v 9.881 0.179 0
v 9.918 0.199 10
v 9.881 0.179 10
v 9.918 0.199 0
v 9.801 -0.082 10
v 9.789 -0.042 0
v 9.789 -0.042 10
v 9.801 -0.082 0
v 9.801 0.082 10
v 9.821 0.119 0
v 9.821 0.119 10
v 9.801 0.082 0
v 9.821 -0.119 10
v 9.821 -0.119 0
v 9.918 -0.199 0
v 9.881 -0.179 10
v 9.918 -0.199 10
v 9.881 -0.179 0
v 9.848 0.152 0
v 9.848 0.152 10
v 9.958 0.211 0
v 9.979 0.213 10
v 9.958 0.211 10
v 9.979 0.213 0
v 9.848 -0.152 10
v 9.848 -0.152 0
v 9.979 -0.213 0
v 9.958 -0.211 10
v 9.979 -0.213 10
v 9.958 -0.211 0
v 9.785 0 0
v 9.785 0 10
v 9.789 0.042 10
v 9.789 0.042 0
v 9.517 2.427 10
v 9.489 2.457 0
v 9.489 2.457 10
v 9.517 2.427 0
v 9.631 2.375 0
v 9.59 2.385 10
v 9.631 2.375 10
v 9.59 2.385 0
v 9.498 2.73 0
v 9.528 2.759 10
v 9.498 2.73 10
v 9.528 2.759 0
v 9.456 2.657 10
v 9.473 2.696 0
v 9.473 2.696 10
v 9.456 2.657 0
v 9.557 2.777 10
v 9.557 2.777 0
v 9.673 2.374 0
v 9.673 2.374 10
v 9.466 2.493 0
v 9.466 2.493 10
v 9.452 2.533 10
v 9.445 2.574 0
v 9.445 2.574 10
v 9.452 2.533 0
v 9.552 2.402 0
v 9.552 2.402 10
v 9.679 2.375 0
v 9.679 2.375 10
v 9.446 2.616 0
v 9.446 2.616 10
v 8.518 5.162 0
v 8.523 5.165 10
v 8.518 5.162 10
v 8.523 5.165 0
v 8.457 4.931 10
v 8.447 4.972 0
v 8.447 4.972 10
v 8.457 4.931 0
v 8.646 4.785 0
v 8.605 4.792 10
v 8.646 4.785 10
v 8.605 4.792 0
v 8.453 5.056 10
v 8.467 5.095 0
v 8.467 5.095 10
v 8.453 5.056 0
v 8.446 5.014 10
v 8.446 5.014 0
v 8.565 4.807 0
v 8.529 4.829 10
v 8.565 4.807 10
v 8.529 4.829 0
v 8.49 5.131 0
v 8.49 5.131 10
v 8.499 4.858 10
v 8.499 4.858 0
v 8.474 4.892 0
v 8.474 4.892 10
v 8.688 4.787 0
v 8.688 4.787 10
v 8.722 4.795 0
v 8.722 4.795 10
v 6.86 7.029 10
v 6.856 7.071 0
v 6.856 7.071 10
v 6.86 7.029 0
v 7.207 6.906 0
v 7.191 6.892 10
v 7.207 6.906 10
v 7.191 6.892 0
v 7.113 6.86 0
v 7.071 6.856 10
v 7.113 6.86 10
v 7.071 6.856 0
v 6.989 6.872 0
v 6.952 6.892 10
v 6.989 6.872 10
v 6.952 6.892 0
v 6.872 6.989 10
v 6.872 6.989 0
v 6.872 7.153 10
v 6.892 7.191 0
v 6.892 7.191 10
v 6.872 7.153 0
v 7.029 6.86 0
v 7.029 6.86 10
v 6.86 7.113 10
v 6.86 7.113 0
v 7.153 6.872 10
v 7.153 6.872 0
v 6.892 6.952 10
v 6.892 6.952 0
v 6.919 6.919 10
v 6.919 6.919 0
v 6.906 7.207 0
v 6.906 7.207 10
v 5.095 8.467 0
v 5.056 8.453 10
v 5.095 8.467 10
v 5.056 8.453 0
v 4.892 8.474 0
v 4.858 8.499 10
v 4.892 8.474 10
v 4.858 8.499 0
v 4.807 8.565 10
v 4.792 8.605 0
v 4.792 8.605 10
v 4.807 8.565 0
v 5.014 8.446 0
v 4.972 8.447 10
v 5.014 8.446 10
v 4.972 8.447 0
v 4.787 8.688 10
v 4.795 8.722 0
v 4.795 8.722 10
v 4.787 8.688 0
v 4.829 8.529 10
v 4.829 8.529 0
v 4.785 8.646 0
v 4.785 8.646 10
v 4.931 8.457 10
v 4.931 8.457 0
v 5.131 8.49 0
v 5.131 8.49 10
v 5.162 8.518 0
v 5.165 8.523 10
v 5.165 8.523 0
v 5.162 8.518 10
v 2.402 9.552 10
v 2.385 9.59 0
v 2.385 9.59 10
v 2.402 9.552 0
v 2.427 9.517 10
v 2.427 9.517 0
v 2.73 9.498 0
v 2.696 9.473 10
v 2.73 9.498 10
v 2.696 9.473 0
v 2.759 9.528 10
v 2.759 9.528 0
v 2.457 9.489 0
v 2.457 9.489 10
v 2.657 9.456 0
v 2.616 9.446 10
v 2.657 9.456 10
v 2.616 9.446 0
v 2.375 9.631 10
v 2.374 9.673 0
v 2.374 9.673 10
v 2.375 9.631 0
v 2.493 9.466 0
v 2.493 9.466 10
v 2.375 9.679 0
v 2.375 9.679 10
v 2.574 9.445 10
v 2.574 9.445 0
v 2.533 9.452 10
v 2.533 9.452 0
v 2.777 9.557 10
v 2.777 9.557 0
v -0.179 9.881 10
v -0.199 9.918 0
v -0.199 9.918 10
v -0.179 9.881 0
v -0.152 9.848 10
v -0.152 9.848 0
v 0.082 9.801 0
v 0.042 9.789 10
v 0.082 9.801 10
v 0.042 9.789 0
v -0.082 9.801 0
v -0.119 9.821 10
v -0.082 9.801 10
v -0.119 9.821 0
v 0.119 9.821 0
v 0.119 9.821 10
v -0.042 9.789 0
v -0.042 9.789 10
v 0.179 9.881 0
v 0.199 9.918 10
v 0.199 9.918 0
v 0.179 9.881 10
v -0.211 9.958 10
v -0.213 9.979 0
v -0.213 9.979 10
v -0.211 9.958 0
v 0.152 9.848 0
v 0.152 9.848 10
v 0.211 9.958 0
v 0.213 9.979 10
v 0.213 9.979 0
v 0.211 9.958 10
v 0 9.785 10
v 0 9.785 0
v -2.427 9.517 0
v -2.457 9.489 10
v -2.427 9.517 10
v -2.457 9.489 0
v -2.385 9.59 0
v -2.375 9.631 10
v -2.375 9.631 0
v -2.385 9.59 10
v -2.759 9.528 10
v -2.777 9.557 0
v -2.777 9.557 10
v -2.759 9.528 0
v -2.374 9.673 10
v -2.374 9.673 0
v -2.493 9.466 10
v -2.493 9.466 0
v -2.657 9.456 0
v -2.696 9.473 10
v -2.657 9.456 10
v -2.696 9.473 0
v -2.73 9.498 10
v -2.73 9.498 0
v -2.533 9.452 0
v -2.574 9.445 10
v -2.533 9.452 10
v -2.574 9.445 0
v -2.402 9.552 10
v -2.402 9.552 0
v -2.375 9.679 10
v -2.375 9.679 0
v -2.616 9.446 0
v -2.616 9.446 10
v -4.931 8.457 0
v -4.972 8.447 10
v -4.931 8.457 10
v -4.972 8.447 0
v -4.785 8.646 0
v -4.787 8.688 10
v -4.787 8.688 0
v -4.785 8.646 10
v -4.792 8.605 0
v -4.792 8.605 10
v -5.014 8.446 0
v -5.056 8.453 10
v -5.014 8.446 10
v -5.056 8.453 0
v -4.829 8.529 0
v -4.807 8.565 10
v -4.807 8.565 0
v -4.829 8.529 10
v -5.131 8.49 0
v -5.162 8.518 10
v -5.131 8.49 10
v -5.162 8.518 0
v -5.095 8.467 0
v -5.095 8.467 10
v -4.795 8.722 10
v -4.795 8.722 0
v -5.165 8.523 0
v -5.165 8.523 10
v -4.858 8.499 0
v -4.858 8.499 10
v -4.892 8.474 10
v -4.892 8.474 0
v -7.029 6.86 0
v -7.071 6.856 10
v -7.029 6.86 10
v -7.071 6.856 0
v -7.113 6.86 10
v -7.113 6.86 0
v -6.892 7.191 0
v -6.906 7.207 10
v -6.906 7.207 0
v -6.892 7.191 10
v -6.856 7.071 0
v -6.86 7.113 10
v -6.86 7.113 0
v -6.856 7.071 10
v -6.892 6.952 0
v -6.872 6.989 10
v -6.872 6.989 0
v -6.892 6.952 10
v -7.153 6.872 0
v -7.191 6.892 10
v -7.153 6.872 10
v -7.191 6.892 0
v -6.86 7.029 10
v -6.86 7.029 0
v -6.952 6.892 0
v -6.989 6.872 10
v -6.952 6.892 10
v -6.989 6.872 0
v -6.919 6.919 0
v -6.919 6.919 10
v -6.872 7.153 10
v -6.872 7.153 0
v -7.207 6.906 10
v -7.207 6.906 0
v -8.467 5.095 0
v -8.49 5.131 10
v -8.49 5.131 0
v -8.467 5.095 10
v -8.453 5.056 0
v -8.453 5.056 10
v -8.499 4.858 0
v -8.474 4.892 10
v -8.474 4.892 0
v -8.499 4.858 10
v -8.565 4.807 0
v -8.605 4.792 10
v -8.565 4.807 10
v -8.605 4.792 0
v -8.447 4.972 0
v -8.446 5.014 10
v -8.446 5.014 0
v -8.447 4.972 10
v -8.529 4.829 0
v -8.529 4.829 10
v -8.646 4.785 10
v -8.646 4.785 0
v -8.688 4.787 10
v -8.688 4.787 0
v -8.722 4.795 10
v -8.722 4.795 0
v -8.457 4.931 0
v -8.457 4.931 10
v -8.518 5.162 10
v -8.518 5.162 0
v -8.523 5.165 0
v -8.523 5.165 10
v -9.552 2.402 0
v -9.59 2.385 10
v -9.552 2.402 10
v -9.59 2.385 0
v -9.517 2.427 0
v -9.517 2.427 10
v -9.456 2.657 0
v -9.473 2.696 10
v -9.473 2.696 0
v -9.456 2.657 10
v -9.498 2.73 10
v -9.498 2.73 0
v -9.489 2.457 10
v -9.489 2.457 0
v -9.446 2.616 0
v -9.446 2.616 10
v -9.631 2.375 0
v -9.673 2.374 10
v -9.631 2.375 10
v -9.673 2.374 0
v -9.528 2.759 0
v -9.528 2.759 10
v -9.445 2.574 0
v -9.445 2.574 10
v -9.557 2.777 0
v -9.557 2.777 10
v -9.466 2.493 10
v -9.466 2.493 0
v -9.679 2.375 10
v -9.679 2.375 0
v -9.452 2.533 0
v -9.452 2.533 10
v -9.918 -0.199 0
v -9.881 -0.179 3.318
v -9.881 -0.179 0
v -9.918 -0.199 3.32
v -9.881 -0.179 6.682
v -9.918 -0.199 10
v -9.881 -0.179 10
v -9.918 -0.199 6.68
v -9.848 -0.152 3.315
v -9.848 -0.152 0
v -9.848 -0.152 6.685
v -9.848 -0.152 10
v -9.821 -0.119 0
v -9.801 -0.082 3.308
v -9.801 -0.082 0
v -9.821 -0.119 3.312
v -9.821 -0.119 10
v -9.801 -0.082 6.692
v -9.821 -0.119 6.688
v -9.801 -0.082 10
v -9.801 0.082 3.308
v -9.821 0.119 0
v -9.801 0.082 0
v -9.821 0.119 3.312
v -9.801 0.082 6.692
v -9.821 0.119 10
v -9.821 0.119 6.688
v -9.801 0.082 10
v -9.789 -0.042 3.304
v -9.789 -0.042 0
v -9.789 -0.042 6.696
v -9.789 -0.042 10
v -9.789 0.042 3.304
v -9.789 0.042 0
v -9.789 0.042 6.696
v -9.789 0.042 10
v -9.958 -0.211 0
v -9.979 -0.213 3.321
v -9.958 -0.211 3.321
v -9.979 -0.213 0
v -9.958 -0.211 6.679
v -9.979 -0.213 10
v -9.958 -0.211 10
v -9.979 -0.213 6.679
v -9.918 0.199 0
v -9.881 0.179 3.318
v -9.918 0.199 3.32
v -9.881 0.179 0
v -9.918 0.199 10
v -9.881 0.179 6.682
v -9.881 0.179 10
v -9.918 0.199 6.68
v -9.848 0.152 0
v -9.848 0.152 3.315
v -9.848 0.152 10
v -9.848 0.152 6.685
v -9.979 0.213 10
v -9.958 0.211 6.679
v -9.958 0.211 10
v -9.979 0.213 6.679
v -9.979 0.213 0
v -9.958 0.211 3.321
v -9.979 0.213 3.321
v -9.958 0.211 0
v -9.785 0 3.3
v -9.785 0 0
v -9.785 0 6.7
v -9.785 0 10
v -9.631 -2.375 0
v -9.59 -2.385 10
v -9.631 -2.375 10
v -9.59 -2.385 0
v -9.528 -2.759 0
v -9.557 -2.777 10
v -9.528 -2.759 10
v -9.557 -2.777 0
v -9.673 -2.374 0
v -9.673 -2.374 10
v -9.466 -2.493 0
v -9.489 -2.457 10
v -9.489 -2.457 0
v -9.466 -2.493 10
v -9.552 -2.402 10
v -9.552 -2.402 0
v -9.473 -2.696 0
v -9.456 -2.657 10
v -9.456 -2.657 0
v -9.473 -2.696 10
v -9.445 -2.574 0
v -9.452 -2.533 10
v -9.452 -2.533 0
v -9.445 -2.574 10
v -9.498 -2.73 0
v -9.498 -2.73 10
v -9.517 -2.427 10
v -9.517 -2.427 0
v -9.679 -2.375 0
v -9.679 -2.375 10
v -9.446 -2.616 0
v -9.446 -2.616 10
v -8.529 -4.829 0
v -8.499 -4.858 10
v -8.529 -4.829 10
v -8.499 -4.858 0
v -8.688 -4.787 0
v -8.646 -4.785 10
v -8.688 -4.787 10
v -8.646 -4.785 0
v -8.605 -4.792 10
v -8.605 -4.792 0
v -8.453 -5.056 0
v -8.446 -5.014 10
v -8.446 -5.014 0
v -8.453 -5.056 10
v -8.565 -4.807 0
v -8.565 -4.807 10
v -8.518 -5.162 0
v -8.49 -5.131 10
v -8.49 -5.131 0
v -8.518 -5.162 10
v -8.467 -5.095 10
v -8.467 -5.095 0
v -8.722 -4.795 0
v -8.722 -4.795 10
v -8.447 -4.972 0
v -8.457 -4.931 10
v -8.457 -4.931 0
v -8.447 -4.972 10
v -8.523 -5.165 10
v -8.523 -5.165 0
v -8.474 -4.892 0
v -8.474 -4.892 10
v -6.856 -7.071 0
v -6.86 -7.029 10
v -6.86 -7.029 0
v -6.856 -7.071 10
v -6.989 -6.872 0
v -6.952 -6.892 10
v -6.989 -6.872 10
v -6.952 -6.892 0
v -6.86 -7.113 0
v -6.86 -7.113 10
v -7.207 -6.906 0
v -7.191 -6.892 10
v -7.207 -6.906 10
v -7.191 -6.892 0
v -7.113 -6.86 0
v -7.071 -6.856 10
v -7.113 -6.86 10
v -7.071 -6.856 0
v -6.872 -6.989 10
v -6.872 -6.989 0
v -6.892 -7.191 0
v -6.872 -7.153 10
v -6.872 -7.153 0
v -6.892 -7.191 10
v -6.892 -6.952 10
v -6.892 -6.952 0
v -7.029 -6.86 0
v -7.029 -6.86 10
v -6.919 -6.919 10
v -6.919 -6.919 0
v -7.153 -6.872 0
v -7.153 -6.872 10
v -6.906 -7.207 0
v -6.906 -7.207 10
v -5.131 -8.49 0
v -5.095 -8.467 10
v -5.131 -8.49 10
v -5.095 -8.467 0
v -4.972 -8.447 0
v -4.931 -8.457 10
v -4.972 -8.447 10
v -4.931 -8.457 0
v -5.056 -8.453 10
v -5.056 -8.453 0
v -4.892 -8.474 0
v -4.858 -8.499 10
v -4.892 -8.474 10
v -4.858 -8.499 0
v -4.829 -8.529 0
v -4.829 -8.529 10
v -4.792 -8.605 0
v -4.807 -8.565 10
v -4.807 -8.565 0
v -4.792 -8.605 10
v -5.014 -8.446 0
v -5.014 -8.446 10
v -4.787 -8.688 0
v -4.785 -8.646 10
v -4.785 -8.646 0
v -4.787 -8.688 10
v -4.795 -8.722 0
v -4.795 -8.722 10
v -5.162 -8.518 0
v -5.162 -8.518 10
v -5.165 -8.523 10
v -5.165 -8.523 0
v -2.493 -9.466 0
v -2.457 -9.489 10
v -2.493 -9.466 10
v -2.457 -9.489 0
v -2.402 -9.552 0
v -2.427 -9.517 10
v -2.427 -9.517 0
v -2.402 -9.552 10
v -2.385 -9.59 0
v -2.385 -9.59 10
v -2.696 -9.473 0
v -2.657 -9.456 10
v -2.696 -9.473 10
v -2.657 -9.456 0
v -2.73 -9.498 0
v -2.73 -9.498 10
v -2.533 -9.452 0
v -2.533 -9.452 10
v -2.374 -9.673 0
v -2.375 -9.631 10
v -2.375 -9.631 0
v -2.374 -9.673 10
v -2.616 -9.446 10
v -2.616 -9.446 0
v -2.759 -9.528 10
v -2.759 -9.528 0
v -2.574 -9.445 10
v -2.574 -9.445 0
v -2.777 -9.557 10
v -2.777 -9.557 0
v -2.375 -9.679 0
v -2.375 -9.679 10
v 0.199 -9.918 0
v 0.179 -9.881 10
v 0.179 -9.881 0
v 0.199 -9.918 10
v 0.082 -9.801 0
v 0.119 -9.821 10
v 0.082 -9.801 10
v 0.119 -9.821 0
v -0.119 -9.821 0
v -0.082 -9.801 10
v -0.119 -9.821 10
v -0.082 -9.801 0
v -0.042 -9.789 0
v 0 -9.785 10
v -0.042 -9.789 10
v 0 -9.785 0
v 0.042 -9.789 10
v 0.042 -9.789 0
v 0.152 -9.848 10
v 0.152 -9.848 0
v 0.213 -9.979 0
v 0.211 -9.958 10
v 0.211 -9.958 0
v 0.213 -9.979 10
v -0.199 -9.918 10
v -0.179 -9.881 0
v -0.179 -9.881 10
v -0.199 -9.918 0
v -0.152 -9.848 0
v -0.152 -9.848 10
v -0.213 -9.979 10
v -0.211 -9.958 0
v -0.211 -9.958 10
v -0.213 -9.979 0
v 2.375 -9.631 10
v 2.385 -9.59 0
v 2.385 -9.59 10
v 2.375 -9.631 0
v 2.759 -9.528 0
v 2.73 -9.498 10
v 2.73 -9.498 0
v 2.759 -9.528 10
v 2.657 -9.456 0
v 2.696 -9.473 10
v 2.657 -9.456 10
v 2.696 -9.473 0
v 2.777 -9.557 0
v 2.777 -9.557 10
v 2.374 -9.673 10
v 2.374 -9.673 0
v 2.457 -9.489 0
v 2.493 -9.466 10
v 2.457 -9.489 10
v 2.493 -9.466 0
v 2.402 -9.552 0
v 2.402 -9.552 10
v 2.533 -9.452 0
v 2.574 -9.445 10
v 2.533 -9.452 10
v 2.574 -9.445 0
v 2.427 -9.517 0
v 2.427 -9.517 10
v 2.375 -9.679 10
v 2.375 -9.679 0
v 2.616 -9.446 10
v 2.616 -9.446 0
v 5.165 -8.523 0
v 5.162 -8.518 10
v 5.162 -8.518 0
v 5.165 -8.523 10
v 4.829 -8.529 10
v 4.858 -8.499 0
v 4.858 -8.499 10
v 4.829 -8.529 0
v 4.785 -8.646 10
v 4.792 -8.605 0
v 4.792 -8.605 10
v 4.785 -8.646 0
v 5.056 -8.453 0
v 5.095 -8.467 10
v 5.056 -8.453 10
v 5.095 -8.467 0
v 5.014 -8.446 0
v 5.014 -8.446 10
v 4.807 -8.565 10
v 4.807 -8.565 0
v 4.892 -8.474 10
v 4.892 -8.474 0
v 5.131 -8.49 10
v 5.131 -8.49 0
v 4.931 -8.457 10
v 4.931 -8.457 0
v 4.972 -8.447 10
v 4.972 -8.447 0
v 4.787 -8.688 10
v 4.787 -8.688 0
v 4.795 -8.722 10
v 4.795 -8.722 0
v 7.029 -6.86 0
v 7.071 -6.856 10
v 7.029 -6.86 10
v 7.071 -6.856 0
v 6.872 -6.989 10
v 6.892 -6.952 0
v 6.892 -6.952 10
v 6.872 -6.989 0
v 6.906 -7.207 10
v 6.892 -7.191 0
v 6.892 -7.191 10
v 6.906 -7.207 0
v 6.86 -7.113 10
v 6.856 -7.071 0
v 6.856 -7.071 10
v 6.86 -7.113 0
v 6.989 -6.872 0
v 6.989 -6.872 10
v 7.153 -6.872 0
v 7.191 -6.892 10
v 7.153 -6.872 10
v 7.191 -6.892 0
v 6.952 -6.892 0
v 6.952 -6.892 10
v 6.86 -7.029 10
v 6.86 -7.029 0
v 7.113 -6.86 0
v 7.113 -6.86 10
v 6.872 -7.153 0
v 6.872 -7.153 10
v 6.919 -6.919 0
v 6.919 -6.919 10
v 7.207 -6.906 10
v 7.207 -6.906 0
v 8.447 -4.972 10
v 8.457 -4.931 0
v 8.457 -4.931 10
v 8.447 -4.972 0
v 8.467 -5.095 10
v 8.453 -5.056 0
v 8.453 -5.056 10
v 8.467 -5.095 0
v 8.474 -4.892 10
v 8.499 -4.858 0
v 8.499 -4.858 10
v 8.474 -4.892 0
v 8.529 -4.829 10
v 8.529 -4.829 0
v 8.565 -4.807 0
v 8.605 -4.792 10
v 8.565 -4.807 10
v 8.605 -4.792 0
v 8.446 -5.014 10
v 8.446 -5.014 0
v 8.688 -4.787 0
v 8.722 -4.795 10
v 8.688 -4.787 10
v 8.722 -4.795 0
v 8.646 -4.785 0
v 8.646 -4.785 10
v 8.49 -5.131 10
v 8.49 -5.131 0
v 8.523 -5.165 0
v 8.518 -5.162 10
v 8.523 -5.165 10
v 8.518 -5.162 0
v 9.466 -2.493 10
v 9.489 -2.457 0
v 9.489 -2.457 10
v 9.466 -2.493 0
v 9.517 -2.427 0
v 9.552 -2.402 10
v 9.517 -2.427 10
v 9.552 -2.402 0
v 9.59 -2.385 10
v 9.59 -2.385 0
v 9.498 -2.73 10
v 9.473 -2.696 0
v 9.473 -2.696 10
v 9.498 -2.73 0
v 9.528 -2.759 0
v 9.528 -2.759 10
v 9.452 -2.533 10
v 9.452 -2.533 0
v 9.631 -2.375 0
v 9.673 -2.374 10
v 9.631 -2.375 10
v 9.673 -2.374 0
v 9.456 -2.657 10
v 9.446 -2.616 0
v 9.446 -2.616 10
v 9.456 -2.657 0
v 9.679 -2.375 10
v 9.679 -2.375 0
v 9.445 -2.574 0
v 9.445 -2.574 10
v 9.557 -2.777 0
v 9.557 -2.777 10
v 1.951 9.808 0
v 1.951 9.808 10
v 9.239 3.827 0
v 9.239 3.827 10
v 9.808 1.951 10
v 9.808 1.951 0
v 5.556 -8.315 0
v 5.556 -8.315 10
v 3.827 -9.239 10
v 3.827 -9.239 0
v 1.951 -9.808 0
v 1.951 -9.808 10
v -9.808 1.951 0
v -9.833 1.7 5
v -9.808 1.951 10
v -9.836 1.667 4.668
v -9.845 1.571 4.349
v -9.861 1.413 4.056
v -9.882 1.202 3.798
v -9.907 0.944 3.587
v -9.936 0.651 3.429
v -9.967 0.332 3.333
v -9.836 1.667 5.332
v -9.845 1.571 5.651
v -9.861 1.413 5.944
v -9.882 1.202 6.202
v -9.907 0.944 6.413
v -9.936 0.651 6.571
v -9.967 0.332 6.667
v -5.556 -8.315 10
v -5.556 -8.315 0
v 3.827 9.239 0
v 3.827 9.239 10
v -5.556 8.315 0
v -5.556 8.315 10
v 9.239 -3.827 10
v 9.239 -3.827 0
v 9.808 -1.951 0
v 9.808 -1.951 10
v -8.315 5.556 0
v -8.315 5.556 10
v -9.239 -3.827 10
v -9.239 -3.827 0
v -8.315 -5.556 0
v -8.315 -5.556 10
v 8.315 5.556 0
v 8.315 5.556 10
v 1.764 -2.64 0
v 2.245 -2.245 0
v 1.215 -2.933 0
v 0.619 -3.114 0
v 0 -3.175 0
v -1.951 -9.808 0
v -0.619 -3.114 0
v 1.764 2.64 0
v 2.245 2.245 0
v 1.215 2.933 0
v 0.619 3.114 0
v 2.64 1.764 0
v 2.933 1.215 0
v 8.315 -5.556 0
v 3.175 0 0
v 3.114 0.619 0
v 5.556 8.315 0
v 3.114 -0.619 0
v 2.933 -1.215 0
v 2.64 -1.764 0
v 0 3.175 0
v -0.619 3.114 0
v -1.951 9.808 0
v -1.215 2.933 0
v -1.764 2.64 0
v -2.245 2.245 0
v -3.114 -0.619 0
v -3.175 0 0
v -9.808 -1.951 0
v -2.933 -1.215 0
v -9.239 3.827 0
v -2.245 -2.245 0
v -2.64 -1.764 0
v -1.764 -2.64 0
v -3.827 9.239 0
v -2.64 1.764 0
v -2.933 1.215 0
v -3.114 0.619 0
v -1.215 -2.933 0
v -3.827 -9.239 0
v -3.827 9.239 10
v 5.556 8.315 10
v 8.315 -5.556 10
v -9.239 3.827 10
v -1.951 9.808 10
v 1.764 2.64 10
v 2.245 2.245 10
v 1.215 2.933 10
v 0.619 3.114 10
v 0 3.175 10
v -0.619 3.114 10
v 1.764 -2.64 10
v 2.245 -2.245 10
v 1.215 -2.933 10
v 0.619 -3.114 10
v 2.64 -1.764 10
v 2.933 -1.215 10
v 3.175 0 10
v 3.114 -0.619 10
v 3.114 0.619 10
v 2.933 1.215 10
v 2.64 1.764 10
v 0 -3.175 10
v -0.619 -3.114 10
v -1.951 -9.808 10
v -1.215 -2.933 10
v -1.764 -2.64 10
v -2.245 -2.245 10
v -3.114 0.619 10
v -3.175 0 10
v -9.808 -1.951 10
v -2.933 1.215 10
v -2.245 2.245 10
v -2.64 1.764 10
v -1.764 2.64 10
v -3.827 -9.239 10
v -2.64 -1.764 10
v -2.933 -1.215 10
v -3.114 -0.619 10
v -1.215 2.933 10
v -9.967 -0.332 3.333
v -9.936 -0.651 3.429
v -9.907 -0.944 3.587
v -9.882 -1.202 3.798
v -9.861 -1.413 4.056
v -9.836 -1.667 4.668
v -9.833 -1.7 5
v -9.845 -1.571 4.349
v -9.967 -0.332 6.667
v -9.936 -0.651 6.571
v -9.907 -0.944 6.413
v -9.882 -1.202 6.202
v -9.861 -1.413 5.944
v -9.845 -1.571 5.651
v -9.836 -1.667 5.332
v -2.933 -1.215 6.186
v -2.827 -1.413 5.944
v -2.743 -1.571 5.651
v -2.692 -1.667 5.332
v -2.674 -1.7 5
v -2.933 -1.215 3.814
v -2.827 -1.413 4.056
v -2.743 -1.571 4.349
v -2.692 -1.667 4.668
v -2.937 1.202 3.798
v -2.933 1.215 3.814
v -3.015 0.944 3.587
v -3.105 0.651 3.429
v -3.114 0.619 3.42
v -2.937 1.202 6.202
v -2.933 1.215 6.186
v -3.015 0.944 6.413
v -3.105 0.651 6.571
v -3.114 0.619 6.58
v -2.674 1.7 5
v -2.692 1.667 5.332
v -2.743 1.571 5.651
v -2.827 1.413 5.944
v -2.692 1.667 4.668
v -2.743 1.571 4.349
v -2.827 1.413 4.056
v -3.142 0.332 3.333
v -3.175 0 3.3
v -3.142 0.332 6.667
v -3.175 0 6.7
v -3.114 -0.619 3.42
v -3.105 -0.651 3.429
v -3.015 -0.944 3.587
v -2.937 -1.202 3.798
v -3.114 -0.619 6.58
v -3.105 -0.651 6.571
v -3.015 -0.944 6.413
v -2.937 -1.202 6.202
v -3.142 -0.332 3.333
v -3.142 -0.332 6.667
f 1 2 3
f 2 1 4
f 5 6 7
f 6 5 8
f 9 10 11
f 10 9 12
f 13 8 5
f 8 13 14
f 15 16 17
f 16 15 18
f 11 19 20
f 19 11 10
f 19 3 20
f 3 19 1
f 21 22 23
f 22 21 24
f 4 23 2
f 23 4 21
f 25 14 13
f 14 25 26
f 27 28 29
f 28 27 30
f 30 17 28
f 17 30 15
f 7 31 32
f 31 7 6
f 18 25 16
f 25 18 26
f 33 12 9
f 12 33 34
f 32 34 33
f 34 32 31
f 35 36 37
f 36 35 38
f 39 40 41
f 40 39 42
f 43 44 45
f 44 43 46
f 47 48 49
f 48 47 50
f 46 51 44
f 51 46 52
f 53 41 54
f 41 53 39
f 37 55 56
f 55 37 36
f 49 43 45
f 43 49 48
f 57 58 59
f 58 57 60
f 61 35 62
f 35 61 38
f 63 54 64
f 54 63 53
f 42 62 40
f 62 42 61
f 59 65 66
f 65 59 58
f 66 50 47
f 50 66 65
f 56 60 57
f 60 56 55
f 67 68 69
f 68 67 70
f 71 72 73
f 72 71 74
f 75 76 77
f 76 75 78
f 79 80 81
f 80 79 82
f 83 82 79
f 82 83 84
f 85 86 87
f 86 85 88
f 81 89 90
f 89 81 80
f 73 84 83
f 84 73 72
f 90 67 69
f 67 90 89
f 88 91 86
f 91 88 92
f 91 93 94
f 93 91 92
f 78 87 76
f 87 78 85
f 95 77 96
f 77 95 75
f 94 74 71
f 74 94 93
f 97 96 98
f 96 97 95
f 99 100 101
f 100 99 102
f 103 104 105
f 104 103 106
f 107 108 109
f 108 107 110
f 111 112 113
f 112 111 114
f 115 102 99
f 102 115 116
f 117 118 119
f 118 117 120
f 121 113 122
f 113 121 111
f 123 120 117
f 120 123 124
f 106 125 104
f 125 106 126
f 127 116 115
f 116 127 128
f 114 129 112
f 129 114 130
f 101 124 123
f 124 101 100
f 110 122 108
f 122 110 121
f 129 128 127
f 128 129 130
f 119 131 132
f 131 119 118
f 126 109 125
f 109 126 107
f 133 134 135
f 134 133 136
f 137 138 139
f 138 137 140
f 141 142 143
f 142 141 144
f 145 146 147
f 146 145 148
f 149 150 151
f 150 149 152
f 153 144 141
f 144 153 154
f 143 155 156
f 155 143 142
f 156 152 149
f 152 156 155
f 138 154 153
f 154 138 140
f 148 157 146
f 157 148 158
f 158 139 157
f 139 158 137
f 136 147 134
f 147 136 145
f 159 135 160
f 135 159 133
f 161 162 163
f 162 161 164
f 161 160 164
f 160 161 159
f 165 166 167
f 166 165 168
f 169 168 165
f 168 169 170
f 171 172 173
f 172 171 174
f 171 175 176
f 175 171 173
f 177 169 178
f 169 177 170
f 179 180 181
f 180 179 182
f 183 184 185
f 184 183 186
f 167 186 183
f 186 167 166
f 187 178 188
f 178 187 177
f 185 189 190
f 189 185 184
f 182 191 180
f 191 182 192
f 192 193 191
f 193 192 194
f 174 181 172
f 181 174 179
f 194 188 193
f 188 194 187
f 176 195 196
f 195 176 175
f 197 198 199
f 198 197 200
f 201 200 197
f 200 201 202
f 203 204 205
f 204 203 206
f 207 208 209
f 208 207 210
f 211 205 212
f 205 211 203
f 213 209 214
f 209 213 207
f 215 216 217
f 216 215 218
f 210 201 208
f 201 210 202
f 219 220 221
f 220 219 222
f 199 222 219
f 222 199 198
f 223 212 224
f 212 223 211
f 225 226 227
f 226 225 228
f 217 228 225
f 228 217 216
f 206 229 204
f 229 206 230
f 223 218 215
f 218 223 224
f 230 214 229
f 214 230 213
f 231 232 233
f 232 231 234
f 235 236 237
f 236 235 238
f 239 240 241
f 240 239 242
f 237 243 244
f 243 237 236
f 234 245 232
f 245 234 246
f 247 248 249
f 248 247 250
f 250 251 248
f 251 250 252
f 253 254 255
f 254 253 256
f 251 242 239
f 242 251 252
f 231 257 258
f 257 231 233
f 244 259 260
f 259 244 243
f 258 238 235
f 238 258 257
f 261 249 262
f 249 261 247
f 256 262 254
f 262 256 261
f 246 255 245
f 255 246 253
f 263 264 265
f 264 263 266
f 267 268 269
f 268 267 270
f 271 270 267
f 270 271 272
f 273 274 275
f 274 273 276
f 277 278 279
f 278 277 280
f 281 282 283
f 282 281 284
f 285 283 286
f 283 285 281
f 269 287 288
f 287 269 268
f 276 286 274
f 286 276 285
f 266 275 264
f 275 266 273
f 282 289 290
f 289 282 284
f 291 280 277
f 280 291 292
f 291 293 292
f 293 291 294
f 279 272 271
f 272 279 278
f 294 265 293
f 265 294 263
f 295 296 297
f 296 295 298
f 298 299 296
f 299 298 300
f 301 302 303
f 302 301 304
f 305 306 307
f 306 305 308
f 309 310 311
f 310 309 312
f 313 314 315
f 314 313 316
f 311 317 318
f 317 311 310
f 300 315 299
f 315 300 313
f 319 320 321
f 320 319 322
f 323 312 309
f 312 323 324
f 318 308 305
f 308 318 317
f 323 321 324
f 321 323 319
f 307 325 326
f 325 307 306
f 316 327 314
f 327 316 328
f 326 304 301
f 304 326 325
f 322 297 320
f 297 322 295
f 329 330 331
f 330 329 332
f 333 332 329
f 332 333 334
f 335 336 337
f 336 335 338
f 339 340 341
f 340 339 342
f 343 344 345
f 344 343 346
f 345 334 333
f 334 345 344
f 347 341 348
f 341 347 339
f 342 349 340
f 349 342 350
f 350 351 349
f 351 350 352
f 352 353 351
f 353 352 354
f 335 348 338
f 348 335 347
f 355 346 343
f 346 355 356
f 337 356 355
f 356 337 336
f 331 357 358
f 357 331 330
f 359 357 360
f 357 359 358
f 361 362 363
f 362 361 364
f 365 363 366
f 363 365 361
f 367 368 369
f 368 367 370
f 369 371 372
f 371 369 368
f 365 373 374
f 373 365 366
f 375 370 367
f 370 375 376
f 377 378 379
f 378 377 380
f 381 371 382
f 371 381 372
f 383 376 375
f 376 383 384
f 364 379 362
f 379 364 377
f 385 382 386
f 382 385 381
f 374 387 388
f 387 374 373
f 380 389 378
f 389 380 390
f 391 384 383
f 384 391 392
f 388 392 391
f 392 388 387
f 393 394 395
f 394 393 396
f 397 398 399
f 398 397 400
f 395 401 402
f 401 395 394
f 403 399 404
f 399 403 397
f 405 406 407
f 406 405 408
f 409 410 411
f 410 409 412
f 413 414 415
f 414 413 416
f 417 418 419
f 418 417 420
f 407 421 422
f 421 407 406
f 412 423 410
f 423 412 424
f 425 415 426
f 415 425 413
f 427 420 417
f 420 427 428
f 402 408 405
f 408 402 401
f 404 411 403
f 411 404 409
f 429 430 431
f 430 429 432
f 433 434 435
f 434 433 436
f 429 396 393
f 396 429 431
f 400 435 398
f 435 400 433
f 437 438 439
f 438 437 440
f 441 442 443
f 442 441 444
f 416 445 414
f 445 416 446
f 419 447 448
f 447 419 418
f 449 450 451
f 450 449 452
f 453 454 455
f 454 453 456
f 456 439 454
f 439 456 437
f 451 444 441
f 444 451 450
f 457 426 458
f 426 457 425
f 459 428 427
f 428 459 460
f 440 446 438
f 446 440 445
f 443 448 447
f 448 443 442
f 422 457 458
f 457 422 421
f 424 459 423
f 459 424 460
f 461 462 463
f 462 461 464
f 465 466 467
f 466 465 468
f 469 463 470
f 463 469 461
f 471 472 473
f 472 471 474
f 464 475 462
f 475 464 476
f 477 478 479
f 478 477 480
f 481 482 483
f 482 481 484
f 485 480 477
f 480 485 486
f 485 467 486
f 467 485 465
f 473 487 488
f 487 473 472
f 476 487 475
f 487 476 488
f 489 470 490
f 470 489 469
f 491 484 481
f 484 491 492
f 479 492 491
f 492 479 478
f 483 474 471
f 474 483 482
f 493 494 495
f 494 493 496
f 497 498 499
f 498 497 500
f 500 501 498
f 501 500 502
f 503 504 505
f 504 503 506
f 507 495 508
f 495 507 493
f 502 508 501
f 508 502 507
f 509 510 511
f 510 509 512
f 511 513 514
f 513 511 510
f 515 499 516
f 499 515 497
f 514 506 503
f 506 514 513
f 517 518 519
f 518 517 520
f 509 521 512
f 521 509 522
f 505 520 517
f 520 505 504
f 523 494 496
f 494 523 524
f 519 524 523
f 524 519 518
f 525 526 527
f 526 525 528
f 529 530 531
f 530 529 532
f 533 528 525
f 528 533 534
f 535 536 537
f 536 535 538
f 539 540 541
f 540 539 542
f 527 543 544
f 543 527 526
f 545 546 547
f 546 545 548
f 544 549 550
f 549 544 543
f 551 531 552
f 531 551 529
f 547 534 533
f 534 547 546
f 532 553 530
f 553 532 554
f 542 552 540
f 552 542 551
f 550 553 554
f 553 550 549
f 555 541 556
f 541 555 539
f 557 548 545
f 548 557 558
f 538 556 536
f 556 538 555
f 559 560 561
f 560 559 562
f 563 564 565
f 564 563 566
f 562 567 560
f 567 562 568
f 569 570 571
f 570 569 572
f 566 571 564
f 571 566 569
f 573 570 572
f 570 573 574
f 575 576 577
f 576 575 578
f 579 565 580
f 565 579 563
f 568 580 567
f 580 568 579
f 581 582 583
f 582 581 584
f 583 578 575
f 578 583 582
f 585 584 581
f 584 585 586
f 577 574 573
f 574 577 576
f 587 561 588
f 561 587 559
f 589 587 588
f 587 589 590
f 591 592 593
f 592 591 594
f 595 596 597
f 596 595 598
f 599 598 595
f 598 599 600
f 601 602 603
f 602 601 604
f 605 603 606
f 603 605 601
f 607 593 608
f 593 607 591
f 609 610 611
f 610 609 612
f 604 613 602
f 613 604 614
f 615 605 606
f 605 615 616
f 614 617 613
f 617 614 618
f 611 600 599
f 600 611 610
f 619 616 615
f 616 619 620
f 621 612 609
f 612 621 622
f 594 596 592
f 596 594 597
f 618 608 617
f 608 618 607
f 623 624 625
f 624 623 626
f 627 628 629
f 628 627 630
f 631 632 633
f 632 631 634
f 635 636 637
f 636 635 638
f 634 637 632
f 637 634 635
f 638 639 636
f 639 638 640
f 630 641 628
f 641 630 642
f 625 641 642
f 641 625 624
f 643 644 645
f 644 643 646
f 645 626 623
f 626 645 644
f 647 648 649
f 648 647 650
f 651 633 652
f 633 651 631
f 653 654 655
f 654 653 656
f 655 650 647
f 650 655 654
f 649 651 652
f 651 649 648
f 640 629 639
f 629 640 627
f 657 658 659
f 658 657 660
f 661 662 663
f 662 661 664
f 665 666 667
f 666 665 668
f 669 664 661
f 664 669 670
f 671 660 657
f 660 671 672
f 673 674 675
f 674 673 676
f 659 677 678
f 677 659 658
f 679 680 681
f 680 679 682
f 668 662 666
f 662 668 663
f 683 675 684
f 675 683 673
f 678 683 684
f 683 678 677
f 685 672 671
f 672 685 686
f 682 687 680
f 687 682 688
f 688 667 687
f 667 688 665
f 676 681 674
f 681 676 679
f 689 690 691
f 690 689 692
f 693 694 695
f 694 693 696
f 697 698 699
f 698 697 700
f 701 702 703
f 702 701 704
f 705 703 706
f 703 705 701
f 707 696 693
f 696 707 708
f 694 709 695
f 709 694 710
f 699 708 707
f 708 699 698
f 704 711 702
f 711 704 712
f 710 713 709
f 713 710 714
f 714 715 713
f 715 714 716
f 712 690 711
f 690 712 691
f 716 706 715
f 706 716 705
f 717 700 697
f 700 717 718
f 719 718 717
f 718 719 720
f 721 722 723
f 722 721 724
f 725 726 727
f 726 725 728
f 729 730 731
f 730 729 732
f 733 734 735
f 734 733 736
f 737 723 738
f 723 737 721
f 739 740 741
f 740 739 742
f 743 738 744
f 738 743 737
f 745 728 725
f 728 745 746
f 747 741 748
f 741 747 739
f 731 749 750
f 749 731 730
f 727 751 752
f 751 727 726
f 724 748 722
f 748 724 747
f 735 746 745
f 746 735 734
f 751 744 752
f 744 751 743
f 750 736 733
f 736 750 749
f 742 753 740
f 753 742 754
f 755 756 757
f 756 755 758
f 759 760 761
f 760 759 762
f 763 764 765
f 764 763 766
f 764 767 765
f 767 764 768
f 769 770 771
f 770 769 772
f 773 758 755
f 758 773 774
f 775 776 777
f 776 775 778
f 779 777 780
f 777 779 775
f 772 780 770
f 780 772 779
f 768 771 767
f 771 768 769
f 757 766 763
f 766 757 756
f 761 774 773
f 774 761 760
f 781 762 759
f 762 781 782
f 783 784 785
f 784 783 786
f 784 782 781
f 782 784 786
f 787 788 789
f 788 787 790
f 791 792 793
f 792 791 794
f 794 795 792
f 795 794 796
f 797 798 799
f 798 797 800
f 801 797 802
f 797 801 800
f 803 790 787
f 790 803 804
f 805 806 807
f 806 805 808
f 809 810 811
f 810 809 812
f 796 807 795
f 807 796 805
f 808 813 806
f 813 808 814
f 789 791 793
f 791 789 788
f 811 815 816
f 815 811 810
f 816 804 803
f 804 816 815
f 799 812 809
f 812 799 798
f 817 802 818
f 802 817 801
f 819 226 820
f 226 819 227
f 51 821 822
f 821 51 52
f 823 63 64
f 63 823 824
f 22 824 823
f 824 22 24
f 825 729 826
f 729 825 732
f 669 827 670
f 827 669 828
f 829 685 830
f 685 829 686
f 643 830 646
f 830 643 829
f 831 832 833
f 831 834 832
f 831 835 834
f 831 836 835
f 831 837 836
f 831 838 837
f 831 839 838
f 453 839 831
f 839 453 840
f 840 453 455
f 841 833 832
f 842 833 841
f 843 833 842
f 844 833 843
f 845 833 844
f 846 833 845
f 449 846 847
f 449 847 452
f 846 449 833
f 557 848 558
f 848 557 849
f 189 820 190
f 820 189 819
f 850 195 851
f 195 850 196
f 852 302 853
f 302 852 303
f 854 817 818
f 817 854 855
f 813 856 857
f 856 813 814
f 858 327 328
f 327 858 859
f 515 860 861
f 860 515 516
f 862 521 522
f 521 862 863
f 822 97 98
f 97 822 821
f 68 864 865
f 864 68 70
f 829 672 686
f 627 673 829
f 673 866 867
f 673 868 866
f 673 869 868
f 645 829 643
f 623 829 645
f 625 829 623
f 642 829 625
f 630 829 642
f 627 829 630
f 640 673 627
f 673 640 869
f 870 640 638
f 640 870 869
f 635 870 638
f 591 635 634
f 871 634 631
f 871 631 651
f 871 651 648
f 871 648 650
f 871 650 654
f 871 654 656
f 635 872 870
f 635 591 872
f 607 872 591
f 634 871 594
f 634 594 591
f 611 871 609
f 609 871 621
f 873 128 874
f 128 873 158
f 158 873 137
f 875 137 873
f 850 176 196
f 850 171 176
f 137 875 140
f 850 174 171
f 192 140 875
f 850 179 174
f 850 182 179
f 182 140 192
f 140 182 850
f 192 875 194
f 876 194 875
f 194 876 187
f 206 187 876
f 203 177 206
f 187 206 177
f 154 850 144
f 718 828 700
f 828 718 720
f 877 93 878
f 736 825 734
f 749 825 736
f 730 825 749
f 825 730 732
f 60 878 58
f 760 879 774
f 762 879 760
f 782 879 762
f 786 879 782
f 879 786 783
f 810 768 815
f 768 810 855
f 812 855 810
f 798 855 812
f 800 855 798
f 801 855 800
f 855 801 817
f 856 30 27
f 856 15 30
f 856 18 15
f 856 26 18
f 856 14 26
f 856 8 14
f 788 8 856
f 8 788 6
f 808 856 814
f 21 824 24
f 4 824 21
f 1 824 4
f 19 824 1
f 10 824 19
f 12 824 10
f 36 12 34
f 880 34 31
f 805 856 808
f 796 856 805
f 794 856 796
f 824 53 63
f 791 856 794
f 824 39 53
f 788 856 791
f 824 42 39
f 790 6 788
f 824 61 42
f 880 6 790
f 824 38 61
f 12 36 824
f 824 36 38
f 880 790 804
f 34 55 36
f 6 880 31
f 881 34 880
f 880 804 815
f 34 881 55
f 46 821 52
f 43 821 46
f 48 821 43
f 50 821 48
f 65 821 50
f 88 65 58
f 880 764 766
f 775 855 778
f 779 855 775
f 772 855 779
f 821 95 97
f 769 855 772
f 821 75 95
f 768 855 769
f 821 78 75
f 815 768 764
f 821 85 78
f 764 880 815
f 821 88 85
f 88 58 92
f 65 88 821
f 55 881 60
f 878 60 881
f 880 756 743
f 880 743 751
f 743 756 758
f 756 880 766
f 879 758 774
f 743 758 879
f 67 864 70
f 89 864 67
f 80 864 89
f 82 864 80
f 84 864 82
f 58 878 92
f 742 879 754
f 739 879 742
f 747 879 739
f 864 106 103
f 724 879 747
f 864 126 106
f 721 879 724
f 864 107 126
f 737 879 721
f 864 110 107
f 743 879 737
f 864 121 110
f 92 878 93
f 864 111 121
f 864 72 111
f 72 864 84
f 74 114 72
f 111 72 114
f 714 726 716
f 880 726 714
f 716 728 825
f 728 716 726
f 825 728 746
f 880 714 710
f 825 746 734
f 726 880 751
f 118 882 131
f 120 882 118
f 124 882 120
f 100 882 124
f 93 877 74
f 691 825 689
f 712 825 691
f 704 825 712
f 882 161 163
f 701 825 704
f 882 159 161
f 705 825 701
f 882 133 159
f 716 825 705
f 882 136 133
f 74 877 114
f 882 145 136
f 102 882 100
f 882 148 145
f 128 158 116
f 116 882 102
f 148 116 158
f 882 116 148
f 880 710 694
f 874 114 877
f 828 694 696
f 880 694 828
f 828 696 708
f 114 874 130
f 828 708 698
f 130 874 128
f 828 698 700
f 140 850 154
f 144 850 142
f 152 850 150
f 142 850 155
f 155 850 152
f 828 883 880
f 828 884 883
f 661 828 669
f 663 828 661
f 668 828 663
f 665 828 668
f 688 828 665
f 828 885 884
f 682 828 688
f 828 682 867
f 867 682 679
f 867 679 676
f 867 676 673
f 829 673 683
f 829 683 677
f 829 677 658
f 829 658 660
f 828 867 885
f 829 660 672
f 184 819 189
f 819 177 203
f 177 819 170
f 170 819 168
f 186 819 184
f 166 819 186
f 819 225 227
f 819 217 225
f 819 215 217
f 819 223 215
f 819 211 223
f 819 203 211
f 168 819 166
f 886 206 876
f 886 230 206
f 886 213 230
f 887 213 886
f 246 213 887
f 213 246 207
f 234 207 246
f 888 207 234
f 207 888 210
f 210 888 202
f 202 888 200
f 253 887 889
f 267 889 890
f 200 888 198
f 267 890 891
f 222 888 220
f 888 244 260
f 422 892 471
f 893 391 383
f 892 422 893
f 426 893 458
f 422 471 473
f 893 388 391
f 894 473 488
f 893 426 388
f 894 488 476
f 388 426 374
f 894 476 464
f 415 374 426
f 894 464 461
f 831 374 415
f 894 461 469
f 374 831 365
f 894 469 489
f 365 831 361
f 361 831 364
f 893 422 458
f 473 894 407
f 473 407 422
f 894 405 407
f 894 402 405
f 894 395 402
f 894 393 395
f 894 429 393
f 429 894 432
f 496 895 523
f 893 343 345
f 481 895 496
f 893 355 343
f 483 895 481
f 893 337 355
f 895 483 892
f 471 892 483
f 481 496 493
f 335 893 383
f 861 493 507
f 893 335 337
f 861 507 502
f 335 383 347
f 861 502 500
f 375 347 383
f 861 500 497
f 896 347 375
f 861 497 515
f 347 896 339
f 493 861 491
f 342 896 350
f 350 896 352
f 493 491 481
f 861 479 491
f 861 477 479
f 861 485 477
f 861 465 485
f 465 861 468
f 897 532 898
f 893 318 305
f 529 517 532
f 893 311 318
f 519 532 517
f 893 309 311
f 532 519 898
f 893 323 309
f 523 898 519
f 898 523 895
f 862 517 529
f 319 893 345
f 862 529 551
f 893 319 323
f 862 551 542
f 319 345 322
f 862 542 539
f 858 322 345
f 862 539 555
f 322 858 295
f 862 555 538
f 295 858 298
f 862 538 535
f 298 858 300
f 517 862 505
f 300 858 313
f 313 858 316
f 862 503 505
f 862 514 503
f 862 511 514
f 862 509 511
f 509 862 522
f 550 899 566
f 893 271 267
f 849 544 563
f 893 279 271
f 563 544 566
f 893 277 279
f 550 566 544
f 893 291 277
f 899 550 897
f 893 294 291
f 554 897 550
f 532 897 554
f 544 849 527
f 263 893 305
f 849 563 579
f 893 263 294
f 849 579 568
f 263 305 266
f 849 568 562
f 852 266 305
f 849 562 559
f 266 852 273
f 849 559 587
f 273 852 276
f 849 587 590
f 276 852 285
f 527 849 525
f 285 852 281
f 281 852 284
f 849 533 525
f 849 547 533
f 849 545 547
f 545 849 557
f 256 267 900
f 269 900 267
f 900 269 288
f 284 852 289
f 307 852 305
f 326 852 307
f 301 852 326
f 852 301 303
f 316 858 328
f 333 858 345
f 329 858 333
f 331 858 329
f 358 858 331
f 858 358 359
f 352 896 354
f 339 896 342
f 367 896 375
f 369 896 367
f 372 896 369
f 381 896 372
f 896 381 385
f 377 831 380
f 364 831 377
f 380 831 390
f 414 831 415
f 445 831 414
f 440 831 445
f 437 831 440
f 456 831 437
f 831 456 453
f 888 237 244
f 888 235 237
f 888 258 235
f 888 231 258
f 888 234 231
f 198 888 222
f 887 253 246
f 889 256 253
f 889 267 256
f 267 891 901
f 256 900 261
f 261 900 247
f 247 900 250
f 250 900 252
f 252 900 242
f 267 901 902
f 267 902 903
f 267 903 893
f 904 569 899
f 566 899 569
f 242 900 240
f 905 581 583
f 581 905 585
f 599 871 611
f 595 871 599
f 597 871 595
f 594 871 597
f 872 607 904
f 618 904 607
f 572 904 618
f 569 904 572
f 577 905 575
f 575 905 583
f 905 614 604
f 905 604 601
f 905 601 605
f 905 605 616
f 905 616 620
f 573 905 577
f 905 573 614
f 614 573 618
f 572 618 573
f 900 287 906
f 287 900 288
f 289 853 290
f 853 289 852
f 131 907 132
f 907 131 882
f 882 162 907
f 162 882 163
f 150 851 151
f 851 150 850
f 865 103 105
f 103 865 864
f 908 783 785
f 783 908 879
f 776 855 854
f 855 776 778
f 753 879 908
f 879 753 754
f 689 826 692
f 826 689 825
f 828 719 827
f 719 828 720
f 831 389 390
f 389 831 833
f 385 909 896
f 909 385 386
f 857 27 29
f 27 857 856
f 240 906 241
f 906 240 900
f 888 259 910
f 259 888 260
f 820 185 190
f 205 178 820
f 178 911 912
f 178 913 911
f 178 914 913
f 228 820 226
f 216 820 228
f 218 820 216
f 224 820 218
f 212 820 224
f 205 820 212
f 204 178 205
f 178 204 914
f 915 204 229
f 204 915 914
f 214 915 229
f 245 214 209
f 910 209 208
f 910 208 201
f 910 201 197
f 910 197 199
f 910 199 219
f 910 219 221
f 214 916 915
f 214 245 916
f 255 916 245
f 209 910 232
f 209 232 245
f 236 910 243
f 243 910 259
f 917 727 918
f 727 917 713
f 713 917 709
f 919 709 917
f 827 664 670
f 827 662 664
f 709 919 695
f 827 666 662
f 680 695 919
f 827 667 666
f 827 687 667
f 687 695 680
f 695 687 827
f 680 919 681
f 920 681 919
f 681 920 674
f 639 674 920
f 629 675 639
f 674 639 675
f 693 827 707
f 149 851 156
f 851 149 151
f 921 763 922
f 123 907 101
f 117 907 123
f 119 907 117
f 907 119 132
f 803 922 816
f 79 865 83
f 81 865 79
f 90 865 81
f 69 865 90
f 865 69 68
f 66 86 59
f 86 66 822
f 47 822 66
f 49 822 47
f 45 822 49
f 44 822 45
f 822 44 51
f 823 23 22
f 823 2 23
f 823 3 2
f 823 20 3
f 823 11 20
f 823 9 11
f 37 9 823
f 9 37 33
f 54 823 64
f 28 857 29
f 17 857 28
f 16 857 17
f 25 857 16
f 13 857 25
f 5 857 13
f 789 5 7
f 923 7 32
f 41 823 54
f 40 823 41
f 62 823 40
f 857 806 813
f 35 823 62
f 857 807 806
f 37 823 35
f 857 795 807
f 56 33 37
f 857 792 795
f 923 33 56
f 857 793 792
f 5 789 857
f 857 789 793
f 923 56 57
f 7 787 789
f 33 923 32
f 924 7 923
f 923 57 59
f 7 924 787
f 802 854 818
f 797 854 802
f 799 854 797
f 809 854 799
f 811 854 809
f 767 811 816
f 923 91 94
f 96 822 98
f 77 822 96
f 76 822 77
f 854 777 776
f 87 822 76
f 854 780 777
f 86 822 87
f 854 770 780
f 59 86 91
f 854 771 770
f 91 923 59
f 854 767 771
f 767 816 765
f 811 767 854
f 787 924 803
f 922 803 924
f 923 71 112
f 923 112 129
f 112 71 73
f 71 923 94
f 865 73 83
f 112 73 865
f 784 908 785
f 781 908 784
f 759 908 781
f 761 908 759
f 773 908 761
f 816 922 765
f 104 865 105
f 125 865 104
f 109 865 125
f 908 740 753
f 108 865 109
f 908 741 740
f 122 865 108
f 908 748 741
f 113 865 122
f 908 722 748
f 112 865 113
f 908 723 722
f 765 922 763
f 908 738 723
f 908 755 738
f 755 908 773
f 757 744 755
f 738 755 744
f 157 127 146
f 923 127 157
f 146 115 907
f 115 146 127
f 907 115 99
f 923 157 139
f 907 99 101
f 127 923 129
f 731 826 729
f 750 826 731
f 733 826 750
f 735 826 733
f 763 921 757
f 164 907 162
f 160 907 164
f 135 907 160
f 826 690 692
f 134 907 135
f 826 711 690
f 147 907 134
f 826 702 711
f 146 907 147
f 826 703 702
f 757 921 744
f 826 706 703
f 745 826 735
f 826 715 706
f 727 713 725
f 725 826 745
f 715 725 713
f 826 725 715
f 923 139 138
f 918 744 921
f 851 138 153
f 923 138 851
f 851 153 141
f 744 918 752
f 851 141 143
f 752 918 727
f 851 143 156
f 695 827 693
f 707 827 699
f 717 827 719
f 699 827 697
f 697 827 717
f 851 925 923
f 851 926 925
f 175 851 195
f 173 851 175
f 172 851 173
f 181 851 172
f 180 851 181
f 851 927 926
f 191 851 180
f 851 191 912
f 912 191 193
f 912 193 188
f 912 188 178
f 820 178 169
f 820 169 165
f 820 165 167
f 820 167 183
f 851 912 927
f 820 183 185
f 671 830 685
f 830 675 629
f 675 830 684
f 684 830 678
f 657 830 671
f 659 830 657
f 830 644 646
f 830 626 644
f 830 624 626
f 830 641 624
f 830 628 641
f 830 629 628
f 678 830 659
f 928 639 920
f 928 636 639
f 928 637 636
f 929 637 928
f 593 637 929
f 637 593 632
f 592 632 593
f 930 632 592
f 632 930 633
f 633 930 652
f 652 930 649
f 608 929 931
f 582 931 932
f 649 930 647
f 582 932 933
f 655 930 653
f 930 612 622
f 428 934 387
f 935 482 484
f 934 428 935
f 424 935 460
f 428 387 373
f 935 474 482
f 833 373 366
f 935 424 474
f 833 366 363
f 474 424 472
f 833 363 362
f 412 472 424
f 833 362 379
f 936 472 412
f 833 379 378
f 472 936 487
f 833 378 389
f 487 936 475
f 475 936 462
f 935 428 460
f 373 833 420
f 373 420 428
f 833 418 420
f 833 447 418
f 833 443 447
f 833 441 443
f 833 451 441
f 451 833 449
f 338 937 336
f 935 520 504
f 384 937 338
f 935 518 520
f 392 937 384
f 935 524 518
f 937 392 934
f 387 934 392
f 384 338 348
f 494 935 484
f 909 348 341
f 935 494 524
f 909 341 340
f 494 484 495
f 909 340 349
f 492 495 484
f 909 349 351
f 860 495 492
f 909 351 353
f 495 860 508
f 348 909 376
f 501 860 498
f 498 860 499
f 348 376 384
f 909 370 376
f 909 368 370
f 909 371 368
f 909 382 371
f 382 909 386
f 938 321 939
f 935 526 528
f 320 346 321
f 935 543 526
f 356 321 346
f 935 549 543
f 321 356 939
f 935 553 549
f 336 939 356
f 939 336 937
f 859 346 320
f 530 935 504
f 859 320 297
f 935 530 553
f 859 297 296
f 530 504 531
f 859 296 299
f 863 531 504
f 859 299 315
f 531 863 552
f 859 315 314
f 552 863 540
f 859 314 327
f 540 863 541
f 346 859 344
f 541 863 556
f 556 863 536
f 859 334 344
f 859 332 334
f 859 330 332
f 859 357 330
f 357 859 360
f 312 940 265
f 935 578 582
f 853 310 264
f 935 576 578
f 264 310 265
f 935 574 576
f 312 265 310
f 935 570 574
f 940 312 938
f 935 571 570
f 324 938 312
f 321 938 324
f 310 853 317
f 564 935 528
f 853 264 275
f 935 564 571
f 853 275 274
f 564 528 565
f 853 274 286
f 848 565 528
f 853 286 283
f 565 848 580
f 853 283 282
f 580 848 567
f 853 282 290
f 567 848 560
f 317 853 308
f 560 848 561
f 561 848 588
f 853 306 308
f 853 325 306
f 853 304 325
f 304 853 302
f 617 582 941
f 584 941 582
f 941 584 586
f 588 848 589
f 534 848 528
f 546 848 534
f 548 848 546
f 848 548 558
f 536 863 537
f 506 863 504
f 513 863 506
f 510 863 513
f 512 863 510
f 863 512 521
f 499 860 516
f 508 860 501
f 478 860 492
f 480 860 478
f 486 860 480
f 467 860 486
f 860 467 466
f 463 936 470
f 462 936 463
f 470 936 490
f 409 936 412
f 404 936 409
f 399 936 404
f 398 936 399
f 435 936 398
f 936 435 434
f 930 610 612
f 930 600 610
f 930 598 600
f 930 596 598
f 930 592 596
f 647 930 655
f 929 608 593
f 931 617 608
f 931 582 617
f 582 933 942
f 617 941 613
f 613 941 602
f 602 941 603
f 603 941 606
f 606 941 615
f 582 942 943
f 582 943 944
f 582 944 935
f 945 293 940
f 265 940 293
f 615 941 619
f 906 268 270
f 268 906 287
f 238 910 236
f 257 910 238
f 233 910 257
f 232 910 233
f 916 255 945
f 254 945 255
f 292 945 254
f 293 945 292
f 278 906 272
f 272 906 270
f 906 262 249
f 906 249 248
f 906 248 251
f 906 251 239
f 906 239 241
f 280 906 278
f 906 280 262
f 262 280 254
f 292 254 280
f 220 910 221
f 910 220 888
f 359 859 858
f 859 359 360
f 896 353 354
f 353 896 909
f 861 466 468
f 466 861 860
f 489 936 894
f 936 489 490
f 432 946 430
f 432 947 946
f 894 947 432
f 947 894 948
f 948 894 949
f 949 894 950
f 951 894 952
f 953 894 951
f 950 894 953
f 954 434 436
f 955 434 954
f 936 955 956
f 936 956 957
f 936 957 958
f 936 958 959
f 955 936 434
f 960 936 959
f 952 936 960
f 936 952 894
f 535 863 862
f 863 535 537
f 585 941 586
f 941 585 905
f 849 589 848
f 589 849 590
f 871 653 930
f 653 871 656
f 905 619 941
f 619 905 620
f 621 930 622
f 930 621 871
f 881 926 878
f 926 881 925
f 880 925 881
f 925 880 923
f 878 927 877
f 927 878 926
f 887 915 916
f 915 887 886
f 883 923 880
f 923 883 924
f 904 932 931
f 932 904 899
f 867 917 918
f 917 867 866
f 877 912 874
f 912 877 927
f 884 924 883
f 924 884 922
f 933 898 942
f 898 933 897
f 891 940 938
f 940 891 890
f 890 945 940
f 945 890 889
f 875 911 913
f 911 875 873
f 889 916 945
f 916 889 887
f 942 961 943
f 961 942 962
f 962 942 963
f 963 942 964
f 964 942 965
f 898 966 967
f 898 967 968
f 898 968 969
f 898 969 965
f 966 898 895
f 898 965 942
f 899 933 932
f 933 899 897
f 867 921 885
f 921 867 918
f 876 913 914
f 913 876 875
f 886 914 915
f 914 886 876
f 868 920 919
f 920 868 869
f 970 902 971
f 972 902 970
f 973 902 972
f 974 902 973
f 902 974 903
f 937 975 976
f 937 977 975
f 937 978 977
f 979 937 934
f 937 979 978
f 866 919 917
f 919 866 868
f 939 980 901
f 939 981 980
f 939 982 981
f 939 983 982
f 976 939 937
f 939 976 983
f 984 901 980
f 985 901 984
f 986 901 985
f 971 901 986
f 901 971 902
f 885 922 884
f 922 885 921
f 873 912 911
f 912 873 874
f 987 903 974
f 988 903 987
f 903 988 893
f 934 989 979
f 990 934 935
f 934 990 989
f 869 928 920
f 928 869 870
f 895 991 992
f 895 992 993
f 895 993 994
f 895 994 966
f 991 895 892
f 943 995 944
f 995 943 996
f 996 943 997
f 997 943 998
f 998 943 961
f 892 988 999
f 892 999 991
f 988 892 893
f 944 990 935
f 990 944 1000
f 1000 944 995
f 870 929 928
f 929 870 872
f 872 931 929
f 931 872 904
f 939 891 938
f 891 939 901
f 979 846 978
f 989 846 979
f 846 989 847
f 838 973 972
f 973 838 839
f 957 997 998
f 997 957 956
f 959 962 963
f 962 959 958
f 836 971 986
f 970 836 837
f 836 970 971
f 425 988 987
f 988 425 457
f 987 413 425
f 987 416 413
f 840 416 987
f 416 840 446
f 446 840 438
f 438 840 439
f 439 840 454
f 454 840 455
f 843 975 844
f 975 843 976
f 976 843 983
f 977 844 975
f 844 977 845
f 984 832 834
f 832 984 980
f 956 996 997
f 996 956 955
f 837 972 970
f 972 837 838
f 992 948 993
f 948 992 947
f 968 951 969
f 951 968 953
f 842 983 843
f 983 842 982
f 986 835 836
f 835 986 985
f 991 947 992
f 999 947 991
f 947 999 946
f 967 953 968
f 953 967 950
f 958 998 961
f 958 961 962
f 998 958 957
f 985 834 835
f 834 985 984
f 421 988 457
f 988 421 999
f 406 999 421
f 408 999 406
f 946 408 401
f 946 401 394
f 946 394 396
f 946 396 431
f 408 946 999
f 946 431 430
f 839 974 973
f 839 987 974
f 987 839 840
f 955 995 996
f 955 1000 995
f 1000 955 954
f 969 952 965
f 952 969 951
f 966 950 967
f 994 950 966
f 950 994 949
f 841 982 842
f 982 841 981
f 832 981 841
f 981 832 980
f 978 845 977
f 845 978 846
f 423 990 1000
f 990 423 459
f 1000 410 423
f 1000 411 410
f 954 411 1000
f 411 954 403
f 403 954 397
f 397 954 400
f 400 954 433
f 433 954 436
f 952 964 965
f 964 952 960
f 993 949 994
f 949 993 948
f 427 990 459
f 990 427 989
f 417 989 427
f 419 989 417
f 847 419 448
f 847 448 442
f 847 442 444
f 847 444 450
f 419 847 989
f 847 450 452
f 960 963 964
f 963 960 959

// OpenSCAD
$fn = 32;

// ----------------------------------------------------------------------
// Hand knob: 20 x 20 x 10 mm
// ----------------------------------------------------------------------

// --- parameters (mm) ---
head_d = 20;              // knob diameter
head_h = 10;              // knob height
hole_d = 6.35;            // shaft bore
set_d = 3.4;              // set screw tap hole
notch_d = 0.43;           // knurl groove diameter
knurl_n = 24;             // number of knurl grooves

module body() {
  cylinder(h = head_h, d = head_d);
}

difference() {
  union() {
    body();
  }
  translate([0, 0, -1]) cylinder(h = head_h + 0 + 2, d = hole_d);
  /* knurl grooves */
  for (i = [0 : knurl_n - 1])
    rotate([0, 0, i * 360 / knurl_n])
      translate([head_d / 2, 0, -0.5])
        cylinder(h = head_h + 1, d = notch_d);
  translate([-head_d / 2 - 1, 0, head_h * 0.5]) rotate([0, 90, 0]) cylinder(h = head_d / 2 + 2, d = set_d);
}
